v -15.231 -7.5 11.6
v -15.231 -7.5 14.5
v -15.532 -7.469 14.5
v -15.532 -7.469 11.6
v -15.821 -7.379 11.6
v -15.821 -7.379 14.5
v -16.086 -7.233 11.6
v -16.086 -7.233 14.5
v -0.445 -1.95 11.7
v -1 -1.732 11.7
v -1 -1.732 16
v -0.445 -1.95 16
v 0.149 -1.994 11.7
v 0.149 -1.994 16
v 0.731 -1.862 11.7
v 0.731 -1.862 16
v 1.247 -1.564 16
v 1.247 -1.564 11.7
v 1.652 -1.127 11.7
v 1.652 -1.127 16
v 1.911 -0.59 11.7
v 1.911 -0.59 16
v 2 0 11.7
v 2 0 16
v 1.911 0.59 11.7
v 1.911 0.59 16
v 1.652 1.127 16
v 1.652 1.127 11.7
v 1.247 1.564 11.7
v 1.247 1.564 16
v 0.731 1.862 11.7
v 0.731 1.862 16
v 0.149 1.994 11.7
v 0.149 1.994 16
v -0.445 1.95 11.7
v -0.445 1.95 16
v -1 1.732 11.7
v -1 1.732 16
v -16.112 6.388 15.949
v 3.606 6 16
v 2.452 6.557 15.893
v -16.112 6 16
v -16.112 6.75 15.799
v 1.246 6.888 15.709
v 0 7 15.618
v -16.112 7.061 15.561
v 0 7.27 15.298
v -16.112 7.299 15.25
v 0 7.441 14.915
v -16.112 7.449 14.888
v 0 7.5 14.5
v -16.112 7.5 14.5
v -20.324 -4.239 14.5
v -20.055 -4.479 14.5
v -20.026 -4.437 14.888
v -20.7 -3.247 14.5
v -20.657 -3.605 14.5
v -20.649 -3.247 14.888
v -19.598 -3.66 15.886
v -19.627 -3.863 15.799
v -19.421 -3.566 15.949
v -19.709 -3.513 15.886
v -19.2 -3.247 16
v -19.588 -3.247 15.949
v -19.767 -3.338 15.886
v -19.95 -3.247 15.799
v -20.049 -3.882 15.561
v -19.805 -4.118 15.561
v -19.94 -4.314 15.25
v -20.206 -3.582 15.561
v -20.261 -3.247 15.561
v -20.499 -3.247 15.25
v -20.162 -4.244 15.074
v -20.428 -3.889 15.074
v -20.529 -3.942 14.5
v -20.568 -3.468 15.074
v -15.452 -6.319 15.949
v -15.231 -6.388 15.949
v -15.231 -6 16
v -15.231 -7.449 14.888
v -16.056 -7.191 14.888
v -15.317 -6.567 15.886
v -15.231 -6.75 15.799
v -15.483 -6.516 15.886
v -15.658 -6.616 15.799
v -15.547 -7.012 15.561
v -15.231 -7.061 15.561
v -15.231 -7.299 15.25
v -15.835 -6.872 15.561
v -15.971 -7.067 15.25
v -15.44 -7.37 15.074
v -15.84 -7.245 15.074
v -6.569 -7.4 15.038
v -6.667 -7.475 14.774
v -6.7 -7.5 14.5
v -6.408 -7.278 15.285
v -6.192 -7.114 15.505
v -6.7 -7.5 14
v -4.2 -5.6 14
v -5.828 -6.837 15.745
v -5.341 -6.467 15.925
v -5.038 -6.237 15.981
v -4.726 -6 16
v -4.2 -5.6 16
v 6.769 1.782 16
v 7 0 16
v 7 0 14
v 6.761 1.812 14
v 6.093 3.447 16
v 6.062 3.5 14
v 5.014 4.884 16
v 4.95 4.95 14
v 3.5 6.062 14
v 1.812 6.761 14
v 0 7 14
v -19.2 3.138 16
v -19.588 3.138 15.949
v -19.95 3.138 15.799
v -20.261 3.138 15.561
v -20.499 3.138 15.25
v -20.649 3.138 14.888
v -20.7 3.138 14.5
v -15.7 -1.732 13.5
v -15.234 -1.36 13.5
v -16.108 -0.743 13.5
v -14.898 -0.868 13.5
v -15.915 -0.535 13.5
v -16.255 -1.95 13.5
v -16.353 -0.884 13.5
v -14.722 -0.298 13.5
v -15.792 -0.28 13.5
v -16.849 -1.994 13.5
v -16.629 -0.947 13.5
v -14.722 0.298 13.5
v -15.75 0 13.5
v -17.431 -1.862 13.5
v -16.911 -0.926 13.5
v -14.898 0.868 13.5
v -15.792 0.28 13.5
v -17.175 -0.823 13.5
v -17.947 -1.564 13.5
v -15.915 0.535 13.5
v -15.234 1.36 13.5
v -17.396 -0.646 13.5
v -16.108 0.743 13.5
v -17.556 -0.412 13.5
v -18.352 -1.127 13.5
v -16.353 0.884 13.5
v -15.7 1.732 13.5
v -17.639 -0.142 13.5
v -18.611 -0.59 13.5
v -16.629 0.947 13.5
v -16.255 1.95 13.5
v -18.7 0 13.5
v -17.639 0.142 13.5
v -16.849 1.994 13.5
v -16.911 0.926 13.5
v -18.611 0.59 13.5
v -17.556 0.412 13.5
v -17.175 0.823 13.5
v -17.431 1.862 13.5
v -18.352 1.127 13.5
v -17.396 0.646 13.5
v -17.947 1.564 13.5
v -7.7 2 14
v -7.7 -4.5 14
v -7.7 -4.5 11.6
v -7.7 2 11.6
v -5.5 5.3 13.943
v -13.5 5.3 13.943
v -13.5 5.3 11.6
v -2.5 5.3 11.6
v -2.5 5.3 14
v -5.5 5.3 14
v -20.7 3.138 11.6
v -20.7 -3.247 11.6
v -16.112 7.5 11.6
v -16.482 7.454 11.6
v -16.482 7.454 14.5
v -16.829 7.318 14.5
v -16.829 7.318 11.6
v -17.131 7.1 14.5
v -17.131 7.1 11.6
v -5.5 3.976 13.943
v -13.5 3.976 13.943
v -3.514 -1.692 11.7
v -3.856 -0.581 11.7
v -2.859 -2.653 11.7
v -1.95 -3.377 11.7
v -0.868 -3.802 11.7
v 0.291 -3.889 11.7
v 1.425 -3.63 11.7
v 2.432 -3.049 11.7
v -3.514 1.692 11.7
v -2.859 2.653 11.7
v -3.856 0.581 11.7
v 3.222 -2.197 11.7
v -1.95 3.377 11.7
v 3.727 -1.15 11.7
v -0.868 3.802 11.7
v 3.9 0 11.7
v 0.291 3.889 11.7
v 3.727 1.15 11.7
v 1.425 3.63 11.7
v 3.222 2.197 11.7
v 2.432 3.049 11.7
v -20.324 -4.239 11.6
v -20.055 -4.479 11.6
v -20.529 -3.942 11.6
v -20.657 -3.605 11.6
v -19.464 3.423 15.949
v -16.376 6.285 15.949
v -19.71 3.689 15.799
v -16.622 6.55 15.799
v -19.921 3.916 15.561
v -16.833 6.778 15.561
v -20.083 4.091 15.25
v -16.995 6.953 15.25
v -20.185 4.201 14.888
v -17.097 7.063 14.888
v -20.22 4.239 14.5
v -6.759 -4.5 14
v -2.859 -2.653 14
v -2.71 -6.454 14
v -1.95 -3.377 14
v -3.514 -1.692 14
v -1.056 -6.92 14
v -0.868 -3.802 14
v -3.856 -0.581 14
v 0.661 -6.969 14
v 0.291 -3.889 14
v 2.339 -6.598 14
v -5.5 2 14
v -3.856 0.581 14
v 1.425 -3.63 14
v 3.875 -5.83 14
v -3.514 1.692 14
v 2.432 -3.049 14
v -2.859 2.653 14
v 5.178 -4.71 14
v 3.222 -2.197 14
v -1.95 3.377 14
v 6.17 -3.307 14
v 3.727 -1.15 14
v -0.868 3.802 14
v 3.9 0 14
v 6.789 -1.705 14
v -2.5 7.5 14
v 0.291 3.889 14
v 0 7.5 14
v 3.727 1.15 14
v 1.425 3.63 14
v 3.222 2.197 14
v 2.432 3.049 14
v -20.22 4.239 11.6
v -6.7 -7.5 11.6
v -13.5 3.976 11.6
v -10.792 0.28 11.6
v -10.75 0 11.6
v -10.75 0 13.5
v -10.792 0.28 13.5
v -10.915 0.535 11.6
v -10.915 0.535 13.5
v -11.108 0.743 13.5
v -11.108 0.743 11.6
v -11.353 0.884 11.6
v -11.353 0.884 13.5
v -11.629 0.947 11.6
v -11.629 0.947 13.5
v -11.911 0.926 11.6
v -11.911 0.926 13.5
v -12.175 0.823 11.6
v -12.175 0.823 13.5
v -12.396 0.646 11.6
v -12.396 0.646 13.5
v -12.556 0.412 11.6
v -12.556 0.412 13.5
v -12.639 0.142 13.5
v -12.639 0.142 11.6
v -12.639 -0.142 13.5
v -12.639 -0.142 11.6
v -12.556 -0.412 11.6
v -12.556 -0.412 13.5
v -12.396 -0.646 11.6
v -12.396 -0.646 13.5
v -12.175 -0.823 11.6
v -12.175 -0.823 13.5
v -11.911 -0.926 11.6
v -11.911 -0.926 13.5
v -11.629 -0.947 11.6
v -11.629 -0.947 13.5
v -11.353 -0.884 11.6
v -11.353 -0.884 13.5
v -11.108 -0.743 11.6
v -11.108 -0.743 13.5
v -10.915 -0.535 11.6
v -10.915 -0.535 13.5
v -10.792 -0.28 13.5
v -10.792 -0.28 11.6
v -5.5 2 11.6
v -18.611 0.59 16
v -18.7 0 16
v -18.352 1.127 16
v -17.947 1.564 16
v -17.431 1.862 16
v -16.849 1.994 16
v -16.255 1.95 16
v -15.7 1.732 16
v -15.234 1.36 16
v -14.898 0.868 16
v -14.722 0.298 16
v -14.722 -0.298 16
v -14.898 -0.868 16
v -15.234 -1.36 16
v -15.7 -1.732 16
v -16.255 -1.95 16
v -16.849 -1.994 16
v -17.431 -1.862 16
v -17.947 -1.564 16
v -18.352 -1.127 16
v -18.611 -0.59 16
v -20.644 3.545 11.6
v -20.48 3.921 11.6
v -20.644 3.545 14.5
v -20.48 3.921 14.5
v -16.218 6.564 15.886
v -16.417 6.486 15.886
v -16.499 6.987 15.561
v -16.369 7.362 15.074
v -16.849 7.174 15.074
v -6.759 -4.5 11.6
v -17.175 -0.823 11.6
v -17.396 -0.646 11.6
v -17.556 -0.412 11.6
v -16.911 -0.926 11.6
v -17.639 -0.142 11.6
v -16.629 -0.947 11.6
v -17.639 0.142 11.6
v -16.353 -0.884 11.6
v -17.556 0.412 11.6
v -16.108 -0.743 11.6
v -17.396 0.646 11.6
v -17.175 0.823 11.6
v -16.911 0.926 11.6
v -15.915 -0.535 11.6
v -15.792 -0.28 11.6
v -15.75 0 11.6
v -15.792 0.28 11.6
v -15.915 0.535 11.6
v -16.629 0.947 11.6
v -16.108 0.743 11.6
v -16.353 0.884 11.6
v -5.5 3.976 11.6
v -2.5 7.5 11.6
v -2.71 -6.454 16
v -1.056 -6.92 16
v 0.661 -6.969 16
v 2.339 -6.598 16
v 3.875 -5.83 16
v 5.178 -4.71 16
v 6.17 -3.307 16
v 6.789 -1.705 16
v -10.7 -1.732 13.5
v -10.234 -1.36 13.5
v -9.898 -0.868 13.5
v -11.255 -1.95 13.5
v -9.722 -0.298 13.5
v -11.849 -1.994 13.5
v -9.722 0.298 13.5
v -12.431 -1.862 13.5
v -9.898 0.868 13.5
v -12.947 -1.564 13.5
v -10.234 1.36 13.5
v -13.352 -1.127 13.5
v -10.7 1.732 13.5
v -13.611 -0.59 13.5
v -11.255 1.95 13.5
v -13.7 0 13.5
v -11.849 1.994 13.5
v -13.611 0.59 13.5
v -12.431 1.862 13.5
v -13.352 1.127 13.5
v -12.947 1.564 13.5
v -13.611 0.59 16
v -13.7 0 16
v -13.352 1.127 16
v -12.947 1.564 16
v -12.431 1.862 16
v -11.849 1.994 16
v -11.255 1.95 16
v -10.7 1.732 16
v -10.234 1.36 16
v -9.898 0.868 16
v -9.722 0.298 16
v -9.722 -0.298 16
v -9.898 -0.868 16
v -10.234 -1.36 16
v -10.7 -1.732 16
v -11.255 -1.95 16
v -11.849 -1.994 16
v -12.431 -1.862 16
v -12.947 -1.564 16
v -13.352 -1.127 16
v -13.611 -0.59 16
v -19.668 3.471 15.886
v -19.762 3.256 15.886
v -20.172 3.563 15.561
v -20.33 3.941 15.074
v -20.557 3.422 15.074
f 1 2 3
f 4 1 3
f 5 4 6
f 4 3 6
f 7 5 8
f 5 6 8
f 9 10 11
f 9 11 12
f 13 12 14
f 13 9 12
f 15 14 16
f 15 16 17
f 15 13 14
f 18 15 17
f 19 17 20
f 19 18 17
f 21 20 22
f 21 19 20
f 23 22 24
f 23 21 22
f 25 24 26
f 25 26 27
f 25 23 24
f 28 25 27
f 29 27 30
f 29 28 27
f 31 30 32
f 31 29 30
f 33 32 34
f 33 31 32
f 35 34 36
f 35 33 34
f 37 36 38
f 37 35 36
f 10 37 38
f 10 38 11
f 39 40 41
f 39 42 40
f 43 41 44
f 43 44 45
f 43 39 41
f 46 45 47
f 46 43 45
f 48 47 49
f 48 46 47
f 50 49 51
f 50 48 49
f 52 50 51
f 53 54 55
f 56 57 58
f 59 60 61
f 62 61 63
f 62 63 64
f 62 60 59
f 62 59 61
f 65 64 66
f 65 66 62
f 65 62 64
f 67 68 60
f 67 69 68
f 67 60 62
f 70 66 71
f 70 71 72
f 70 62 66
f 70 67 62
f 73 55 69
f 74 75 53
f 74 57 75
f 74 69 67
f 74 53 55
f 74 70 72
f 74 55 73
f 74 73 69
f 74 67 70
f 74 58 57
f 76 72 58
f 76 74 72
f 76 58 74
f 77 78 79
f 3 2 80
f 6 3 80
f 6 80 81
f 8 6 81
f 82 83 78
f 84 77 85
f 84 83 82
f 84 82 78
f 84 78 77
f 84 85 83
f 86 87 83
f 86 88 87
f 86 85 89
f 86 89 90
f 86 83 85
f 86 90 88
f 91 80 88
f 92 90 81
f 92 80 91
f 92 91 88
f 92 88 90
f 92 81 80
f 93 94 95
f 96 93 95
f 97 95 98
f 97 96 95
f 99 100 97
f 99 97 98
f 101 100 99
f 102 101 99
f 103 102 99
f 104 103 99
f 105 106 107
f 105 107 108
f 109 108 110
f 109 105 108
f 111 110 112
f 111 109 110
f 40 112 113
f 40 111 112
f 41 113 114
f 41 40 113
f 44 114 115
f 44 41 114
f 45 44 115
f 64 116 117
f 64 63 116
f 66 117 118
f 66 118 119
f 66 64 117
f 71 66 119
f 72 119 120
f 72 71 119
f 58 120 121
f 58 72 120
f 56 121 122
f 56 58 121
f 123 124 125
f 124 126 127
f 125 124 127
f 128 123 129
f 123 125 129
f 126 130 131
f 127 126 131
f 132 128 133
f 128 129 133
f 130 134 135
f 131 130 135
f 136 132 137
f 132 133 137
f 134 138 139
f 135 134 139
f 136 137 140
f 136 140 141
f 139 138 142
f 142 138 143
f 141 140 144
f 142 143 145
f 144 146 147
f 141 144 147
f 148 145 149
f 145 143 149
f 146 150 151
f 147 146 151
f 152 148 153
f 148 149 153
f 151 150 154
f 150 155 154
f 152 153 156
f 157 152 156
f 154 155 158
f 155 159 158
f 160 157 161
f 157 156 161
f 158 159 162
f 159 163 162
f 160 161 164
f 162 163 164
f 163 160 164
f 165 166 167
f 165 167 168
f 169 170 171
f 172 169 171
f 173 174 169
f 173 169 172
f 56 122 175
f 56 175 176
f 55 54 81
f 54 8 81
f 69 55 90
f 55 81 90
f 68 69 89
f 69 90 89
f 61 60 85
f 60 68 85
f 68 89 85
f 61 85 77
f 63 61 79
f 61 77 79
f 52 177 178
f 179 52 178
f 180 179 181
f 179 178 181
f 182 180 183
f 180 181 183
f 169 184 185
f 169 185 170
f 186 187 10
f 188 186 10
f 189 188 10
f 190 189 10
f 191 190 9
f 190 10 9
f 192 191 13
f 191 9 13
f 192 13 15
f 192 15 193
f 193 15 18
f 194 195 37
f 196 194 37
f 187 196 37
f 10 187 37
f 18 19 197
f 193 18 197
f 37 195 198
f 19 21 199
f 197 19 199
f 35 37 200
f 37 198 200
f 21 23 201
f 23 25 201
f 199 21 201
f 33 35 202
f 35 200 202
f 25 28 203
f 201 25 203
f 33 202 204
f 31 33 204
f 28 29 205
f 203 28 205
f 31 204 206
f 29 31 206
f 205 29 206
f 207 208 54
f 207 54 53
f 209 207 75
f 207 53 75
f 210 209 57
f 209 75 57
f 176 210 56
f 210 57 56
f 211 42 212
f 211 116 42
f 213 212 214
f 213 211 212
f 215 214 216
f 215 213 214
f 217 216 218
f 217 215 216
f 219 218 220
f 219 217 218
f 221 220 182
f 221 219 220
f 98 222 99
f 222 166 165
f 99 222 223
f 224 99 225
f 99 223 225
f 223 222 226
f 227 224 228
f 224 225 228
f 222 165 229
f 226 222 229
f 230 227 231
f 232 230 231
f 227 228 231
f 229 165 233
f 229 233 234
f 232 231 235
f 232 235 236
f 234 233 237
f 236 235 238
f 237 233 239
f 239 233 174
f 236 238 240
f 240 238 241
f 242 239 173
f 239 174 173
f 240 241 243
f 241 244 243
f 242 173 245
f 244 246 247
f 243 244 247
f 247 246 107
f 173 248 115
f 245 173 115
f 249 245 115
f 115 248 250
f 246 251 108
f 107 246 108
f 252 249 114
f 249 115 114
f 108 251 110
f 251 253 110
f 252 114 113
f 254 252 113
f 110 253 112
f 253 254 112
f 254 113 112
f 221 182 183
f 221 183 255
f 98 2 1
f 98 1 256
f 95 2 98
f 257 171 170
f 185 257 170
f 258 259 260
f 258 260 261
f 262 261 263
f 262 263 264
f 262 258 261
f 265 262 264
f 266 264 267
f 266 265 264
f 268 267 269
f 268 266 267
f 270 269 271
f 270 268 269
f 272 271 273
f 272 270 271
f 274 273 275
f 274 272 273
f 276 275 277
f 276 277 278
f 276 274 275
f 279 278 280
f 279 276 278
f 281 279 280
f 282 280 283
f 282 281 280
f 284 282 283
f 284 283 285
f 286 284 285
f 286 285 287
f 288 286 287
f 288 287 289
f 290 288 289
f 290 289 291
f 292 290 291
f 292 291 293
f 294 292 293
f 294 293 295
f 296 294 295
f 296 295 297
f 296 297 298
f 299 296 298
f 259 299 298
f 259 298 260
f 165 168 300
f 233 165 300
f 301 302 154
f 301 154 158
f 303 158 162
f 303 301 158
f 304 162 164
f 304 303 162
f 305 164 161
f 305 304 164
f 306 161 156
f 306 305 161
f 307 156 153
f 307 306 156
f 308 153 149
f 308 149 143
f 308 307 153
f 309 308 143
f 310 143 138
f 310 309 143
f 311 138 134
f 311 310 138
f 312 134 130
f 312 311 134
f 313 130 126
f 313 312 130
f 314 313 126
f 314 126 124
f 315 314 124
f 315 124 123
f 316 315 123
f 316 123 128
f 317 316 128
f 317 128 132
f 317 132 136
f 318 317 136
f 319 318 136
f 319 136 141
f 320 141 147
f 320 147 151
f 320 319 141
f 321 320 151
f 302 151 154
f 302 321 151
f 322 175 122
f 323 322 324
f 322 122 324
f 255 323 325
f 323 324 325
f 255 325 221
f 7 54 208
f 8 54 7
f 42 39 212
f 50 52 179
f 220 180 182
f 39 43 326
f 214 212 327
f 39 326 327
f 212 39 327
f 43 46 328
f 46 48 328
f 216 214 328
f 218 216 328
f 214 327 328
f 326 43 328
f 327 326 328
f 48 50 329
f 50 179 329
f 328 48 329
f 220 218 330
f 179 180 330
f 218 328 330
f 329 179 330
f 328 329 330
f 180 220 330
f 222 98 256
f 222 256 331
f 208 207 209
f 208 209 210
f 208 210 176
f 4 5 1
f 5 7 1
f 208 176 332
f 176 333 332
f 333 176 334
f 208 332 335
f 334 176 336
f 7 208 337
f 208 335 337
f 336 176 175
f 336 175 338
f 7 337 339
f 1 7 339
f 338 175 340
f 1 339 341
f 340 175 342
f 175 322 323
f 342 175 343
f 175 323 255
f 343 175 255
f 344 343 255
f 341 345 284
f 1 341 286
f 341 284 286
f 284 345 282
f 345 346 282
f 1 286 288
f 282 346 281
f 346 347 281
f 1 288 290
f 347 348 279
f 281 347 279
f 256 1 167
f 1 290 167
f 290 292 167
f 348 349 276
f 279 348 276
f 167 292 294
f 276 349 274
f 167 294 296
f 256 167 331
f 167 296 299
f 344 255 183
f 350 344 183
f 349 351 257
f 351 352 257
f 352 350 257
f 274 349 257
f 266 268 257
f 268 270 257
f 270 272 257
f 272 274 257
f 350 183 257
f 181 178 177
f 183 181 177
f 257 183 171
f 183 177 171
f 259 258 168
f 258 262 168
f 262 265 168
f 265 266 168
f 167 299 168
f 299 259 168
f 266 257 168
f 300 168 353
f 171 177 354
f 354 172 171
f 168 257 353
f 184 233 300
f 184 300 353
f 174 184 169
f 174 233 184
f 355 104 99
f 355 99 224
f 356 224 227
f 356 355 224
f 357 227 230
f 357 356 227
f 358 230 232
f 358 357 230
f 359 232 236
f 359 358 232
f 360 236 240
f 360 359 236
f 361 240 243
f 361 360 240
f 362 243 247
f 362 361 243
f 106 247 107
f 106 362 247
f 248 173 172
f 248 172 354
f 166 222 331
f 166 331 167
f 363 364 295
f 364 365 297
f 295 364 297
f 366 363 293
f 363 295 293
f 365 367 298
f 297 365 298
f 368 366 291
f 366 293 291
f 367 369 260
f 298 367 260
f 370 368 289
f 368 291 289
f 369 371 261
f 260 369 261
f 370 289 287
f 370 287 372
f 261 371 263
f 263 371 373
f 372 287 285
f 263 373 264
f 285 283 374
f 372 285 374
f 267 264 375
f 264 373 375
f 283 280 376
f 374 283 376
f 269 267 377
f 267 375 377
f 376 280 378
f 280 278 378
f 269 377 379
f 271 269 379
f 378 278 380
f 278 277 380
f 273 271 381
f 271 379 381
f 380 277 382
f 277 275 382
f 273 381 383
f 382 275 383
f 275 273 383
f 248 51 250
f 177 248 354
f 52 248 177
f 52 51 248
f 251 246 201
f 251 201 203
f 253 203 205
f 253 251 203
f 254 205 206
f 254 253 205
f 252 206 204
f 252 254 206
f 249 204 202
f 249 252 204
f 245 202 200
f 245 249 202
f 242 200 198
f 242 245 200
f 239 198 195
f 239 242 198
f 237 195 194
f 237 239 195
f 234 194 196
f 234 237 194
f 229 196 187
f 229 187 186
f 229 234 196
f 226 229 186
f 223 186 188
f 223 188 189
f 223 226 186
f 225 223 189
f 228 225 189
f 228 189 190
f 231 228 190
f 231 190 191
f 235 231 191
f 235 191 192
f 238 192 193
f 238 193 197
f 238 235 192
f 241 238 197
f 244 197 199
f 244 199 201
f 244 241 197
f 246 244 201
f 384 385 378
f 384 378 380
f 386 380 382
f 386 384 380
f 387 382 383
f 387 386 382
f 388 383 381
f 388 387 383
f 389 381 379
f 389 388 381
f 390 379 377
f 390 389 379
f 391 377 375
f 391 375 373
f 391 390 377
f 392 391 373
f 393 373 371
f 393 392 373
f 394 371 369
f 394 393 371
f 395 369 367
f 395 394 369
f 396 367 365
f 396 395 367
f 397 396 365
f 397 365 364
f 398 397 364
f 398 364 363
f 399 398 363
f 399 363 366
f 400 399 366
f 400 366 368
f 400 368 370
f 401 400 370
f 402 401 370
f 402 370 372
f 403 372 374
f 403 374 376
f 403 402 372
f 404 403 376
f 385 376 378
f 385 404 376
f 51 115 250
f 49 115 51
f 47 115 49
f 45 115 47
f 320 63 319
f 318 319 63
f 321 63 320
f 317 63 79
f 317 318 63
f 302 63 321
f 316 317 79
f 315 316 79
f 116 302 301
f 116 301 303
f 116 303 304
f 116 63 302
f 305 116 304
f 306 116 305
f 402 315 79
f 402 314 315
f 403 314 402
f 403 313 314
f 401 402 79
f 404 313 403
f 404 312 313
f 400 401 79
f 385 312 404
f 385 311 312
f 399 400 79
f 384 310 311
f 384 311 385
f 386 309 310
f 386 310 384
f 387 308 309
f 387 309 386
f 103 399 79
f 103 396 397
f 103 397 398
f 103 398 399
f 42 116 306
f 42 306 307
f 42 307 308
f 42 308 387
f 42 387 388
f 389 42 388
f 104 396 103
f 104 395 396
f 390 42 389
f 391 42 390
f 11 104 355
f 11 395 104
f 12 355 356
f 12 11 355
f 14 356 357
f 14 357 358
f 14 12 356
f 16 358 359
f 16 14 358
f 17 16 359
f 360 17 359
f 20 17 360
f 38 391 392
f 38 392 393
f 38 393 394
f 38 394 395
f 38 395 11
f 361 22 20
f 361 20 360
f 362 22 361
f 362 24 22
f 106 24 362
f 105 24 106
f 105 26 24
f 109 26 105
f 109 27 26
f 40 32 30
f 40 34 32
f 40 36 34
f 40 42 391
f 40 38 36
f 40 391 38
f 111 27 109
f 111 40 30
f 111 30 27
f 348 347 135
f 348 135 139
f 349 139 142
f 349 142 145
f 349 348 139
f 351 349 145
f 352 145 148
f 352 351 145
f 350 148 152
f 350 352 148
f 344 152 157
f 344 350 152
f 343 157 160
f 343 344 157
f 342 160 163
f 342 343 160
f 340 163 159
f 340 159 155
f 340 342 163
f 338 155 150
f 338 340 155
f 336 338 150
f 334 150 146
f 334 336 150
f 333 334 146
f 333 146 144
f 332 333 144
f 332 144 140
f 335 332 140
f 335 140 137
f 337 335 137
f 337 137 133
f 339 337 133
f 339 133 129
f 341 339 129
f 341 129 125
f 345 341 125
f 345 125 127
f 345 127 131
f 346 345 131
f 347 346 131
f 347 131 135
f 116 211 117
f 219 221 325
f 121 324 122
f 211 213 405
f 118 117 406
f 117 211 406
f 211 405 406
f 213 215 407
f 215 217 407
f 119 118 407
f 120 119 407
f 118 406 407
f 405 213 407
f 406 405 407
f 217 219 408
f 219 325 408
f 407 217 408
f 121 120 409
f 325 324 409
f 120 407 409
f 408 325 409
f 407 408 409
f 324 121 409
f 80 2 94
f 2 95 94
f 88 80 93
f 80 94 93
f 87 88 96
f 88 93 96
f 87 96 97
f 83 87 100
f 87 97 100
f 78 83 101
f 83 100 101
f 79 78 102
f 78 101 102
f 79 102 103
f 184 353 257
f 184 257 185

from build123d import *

# Parameters (mm, degrees)
BOSS_EXTRUDE1_DEPTH = 2
BOSS_EXTRUDE2_DEPTH = 6
SKETCH24_R          = 3.9
BOSS_EXTRUDE5_DEPTH = 2.3
SKETCH30_W          = 2.408612022
SKETCH30_H          = 1.324178481
CUT_EXTRUDE12_DEPTH = 8
CUT_EXTRUDE11_DEPTH = 5.3
FILLET1_R           = 1.5
SKETCH34_R          = 0.75
CUT_EXTRUDE13_DEPTH = 8
SKETCH35_R          = 0.75
CUT_EXTRUDE14_DEPTH = 4
SKETCH36_R          = 0.95
CUT_EXTRUDE15_DEPTH = 8
SKETCH37_R          = 2
CUT_EXTRUDE16_DEPTH = 2.5
SKETCH38_W          = 3
SKETCH38_H          = 1.25
CUT_EXTRUDE17_DEPTH = 3.6


with BuildPart() as part:
    # Sketch2 → Boss-Extrude1 (new body)
    with BuildSketch(Plane.XY):
        with BuildLine():
            Line((-2.5, 7.5), (-16.7, 7.5))
            Line((-16.7, 7.5), (-20.7, 3.793442666))
            Line((-20.7, 3.793442666), (-20.7, -4.031648778))
            Line((-20.7, -4.031648778), (-15.7, -7.5))
            Line((-15.7, -7.5), (-6.7, -7.5))
            Line((-6.7, -7.5), (-4.2, -5.6))
            ThreePointArc((-4.2, -5.6), (3.130495168, -6.260990337), (7, 0))
            ThreePointArc((7, 0), (4.949747468, 4.949747468), (0, 7))
            Line((0, 7), (0, 7.5))
            Line((0, 7.5), (-2.5, 7.5))
        make_face()
    extrude(amount=BOSS_EXTRUDE1_DEPTH)

    # Sketch4 → Boss-Extrude2 (add)
    with BuildSketch(Plane.XY.offset(2)):
        Polygon((-15.7, -7.5), (-6.7, -7.5), (-6.759079174, -4.5), (-7.7, -4.5), (-7.7, 2), (-5.5, 2), (-5.5, 5.3), (-2.5, 5.3), (-2.5, 7.5), (-16.7, 7.5), (-20.7, 3.793442666), (-20.7, -4.031648778), align=None)
    extrude(amount=BOSS_EXTRUDE2_DEPTH)

    # Sketch24 → Boss-Extrude5 (add)
    with BuildSketch(Plane.XY.offset(2)):
        Circle(SKETCH24_R)
    extrude(amount=BOSS_EXTRUDE5_DEPTH)

    # Sketch30 → Cut-Extrude12 (cut)
    with BuildSketch(Plane(origin=(-5.5, 0, 0), x_dir=(0, 0, -1), z_dir=(1, 0, 0))):
        with Locations((-3.261593395, 4.63791076)):
            Rectangle(SKETCH30_W, SKETCH30_H)
    extrude(amount=-CUT_EXTRUDE12_DEPTH, mode=Mode.SUBTRACT)

    # Sketch28 → Cut-Extrude11 (cut, through all)
    with BuildSketch(Plane.XY.offset(4.3)):
        with BuildLine():
            Line((-1, 1.732050808), (-1, -1.732050808))
            ThreePointArc((-1, -1.732050808), (2, 0), (-1, 1.732050808))
        make_face()
    extrude(amount=-CUT_EXTRUDE11_DEPTH, mode=Mode.SUBTRACT)

    # Fillet1
    fillet1_edges = [part.edges().sort_by_distance(p)[0] for p in [
        (-11.2, -7.5, 0),
        (-8.35, 7.5, 0),
        (-18.7, 5.646721333, 0),
        (-18.2, -5.765824389, 0),
        (-20.7, -0.119103056, 0),
        (-15.7, -7.5, 4),
        (-20.7, -4.031648778, 4),
        (-20.7, 3.793442666, 4),
        (-16.7, 7.5, 4),
    ]]
    fillet(fillet1_edges, radius=FILLET1_R)

    # Sketch34 → Cut-Extrude13 (cut, along a direction that is not the sketch's normal)
    with BuildSketch(Plane.XZ.offset(-2)):
        with Locations((-7, 8)):
            Circle(SKETCH34_R)
    extrude(amount=-CUT_EXTRUDE13_DEPTH, dir=(0.668583388, -0.743637179, 0), mode=Mode.SUBTRACT)

    # Sketch35 → Cut-Extrude14 (cut, symmetric, along a direction that is not the sketch's normal)
    with BuildSketch(Plane(origin=(0, -4.5, 0), x_dir=(1, 0, 0), z_dir=(0, 1, 0))):
        with Locations((-8.259079174, -8)):
            Circle(SKETCH35_R)
    extrude(amount=CUT_EXTRUDE14_DEPTH, dir=(0.599919418, 0.80006043, 0), both=True, mode=Mode.SUBTRACT)

    # Sketch36 → Cut-Extrude15 (cut)
    with BuildSketch(Plane.XY.offset(8)):
        with Locations((-11.7, 0)):
            Circle(SKETCH36_R)
        with Locations((-16.7, 0)):
            Circle(SKETCH36_R)
    extrude(amount=-CUT_EXTRUDE15_DEPTH, mode=Mode.SUBTRACT)

    # Sketch37 → Cut-Extrude16 (cut)
    with BuildSketch(Plane(origin=(0, 0, 0), x_dir=(-1, 0, 0), z_dir=(0, 0, -1))):
        with Locations((11.7, 0)):
            Circle(SKETCH37_R)
        with Locations((16.7, 0)):
            Circle(SKETCH37_R)
    extrude(amount=-CUT_EXTRUDE16_DEPTH, mode=Mode.SUBTRACT)

    # Sketch38 → Cut-Extrude17 (cut)
    with BuildSketch(Plane.XY.offset(8)):
        with Locations((-4, 5.925)):
            Rectangle(SKETCH38_W, SKETCH38_H)
    extrude(amount=-CUT_EXTRUDE17_DEPTH, mode=Mode.SUBTRACT)


with BuildPart() as body_2:
    # Split2: the piece on the far side of the plane
    add(part.part)
    split(bisect_by=Plane.XY.offset(4.4), keep=Keep.BOTTOM)


with BuildPart() as part_1:
    add(part.part)

    # Split2
    split(bisect_by=Plane.XY.offset(4.4), keep=Keep.TOP)


with BuildPart() as body_3:
    # Mirror2: mirrored copy
    add(body_2.part.mirror(Plane.XY.offset(8)))


solid = body_3.part
